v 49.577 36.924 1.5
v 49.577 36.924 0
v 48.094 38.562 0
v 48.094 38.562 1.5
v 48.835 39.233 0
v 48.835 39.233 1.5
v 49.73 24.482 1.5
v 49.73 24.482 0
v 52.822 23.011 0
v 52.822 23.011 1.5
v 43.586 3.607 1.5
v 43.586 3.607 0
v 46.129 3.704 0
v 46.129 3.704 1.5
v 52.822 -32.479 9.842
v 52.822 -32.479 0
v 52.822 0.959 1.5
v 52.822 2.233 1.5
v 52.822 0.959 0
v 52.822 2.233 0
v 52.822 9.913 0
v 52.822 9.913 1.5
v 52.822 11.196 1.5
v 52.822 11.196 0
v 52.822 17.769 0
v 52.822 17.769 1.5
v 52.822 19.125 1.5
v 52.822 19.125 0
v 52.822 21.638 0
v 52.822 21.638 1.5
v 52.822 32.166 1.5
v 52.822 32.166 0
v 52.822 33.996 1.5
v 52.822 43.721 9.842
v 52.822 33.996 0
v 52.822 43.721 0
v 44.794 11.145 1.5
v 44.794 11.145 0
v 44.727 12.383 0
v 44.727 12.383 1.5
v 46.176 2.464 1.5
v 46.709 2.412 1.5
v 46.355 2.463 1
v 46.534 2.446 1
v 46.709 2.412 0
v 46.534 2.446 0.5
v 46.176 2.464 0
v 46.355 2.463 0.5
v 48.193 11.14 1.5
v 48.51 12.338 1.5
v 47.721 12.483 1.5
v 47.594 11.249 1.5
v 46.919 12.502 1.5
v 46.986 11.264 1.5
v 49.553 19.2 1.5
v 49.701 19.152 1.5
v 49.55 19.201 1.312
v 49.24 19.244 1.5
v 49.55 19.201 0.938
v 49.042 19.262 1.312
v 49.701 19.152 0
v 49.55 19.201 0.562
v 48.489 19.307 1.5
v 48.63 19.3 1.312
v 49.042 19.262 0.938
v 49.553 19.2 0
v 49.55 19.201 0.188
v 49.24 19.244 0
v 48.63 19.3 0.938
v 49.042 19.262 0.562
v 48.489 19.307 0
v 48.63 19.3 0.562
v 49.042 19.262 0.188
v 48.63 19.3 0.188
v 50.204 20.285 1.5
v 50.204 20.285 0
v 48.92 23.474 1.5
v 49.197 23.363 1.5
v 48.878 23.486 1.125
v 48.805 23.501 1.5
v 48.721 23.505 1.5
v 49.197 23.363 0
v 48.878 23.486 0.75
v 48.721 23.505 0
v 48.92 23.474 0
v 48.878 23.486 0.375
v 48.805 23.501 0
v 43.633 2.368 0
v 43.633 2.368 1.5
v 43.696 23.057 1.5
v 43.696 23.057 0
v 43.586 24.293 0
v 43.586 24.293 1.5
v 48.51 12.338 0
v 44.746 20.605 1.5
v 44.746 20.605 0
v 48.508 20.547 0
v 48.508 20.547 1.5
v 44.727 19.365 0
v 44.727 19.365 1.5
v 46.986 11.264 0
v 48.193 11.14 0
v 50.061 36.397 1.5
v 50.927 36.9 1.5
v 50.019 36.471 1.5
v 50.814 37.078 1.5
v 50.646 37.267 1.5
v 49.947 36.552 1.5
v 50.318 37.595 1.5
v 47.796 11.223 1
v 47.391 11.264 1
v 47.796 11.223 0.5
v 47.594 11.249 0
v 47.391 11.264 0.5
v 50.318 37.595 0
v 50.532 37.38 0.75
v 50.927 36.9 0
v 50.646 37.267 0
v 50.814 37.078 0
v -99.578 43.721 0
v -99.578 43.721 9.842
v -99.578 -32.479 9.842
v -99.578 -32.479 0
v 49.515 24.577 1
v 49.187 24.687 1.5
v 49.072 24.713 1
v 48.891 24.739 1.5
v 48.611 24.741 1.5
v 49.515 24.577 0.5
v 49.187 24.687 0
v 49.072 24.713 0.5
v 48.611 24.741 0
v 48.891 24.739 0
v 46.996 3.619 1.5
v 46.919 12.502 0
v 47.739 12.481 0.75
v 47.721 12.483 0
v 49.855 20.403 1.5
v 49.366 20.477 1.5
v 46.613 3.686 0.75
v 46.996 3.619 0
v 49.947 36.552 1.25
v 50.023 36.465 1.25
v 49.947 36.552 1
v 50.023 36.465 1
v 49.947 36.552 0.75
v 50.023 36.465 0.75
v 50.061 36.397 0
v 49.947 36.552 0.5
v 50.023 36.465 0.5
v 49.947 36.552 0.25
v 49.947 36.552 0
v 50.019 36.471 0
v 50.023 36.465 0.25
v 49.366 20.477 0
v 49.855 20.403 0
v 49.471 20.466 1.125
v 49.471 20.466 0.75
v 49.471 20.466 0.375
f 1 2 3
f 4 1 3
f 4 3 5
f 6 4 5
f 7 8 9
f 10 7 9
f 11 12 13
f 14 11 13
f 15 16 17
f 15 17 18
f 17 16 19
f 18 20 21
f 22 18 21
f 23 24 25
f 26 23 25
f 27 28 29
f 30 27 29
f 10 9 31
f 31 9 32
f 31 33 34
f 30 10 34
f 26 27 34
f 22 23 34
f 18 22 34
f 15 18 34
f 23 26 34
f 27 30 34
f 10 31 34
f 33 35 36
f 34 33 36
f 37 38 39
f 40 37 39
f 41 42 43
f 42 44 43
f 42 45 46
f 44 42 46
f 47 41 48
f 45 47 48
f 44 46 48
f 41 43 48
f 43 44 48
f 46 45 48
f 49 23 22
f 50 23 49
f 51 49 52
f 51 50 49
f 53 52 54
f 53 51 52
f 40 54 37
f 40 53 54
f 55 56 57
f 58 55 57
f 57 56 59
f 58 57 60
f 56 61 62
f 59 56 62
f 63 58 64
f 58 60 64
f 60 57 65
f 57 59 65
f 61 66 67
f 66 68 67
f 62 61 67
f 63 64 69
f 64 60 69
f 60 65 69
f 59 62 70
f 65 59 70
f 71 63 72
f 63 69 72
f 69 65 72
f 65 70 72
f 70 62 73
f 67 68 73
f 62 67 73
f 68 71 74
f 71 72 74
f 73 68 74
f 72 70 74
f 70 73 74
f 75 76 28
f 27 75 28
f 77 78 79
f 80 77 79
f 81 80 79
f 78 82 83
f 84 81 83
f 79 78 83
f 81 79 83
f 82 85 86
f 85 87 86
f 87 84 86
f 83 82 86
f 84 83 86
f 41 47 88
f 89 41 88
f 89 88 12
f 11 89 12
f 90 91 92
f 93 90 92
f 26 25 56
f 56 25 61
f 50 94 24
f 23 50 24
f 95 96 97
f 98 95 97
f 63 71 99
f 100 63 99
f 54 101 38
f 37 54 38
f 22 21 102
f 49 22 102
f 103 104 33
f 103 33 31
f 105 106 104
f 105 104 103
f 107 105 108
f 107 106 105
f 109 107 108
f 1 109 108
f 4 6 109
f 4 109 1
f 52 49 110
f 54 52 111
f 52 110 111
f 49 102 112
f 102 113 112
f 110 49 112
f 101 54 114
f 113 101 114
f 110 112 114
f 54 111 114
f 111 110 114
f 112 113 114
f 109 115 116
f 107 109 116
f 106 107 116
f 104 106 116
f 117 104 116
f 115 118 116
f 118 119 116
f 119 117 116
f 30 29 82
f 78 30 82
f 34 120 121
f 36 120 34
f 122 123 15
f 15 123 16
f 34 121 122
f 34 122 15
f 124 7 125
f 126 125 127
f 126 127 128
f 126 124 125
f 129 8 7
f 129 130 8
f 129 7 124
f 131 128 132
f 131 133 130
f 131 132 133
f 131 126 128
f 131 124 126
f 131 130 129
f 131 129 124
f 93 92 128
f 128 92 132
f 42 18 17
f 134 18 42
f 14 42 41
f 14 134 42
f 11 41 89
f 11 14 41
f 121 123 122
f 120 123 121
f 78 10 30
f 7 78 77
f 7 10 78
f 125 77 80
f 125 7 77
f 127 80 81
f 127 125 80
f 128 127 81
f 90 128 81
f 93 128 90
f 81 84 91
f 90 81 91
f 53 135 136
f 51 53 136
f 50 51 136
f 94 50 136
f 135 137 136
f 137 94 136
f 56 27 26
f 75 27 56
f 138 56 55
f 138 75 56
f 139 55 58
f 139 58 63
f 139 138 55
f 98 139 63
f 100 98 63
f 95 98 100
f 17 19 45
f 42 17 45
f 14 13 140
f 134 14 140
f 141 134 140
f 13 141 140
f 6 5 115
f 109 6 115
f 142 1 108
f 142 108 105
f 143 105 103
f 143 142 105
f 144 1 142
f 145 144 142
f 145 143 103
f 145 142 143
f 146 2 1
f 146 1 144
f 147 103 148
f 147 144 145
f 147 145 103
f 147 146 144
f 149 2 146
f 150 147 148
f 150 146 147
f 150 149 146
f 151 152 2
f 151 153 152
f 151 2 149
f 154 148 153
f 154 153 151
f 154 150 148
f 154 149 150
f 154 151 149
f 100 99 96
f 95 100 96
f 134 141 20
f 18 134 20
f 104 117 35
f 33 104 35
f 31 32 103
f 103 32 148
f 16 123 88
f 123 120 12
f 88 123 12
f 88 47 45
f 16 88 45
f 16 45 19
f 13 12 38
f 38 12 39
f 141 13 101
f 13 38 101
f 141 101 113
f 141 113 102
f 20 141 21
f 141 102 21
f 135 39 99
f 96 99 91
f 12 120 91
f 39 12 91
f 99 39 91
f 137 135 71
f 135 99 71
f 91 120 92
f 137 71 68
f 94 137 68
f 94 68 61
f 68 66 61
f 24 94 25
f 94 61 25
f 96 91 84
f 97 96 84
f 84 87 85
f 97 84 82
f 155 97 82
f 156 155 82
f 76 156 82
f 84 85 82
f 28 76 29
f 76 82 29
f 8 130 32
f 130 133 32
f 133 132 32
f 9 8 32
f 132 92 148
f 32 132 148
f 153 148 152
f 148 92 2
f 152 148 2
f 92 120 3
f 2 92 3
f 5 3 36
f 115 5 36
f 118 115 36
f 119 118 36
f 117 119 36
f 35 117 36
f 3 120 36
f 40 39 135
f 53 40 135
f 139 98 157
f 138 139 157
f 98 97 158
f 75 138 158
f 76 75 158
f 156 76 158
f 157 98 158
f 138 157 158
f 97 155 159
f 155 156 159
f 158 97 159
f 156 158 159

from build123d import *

# Parameters (mm, degrees)
SKETCH1_W           = 152.4
SKETCH1_H           = 76.2
BOSS_EXTRUDE1_DEPTH = 9.8425
CUT_EXTRUDE8_DEPTH  = 1.5


with BuildPart() as part:
    # Sketch1 → Boss-Extrude1 (new body)
    with BuildSketch(Plane.XY):
        with Locations((-23.377517564, 5.621311475)):
            Rectangle(SKETCH1_W, SKETCH1_H)
    extrude(amount=BOSS_EXTRUDE1_DEPTH)

    # Sketch3 → Cut-Extrude8 (cut)
    with BuildSketch(Plane(origin=(0, 0, 0), x_dir=(-1, 0, 0), z_dir=(0, 0, -1))):
        with BuildLine():
            Line((-44.726890699, 19.36528147), (-44.746173598, 20.60513153))
            Line((-44.746173598, 20.60513153), (-48.508169632, 20.546622687))
            add(Edge.make_bspline(
                [(-48.508169632, 20.546622687), (-48.675949577, 20.544013272), (-48.999612816, 20.508916083), (-49.453378931, 20.473147329), (-49.871303207, 20.41073695), (-50.080872244, 20.33969012), (-50.203656688, 20.28530547)],
                knots=[0, 0, 0, 0, 0.294090065, 0.560497026, 0.802762471, 1, 1, 1, 1], degree=3))
            Line((-50.203656688, 20.28530547), (-54.969880773, 18.174212082))
            Line((-54.969880773, 18.174212082), (-54.969880773, 16.818021026))
            Line((-54.969880773, 16.818021026), (-49.701481232, 19.15154191))
            add(Edge.make_bspline(
                [(-49.701481232, 19.15154191), (-49.684189468, 19.159200913), (-49.641908349, 19.176694453), (-49.615145416, 19.185491037), (-49.542253946, 19.205696369), (-49.306018818, 19.23908556), (-49.048707603, 19.261574509), (-48.81409331, 19.283282924), (-48.617674753, 19.301576909), (-48.535974126, 19.306040296), (-48.488886733, 19.306772628)],
                knots=[0, 0, 0, 0, 0.0625, 0.125, 0.25, 0.5, 0.625, 0.75, 0.875, 1, 1, 1, 1], degree=3))
            Line((-48.488886733, 19.306772628), (-44.726890699, 19.36528147))
        make_face()
        with BuildLine():
            Line((-48.51035266, 12.33832191), (-54.640552611, 10.71460266))
            Line((-54.640552611, 10.71460266), (-54.323059589, 9.515937494))
            Line((-54.323059589, 9.515937494), (-48.192859639, 11.139656744))
            add(Edge.make_bspline(
                [(-48.192859639, 11.139656744), (-47.801843994, 11.243225899), (-47.389624666, 11.285533217), (-46.985715874, 11.263681617)],
                knots=[0, 0, 0, 0, 1, 1, 1, 1], degree=3))
            Line((-46.985715874, 11.263681617), (-44.793877153, 11.145102413))
            Line((-44.793877153, 11.145102413), (-44.726890699, 12.383291742))
            Line((-44.726890699, 12.383291742), (-46.91872942, 12.501870946))
            add(Edge.make_bspline(
                [(-46.91872942, 12.501870946), (-47.194365308, 12.516782939), (-47.729183274, 12.503182846), (-48.255253092, 12.405890682), (-48.51035266, 12.33832191)],
                knots=[0, 0, 0, 0, 0.511109576, 1, 1, 1, 1], degree=3))
        make_face()
        with BuildLine():
            Line((-43.695780501, 23.057490694), (-43.585687495, 24.292593738))
            Line((-43.585687495, 24.292593738), (-48.610973749, 24.740531156))
            add(Edge.make_bspline(
                [(-49.729956575, 24.482368714), (-49.65941327, 24.515933386), (-49.446393149, 24.611001503), (-49.075607523, 24.730735276), (-48.767132086, 24.754450595), (-48.610973749, 24.740531156)],
                knots=[0, 0, 0, 0, 0.202889278, 0.601788175, 1, 1, 1, 1], degree=3))
            Line((-49.729956575, 24.482368714), (-54.87453465, 22.034566258))
            Line((-54.87453465, 22.034566258), (-54.87453465, 20.661360507))
            Line((-54.87453465, 20.661360507), (-49.197193201, 23.362653042))
            add(Edge.make_bspline(
                [(-49.197193201, 23.362653042), (-49.139010306, 23.390336601), (-49.01099741, 23.446228058), (-48.872225099, 23.490335328), (-48.768651785, 23.507240994), (-48.740242067, 23.507137336), (-48.721066755, 23.505428112)],
                knots=[0, 0, 0, 0, 0.25, 0.5, 0.75, 1, 1, 1, 1], degree=3))
            Line((-48.721066755, 23.505428112), (-43.695780501, 23.057490694))
        make_face()
        with BuildLine():
            Line((-50.927422497, 36.90011515), (-54.94436907, 30.743988904))
            Line((-54.94436907, 30.743988904), (-54.94436907, 28.914050382))
            Line((-54.94436907, 28.914050382), (-50.061346642, 36.39747143))
            add(Edge.make_bspline(
                [(-49.576742638, 36.923837605), (-49.646063205, 36.847240879), (-49.809278874, 36.686241544), (-49.959721756, 36.541529579), (-50.019559683, 36.473902058), (-50.039690523, 36.439546623), (-50.030564548, 36.457569967), (-50.053366622, 36.413042841), (-50.061346642, 36.39747143)],
                knots=[0, 0, 0, 0, 0.26390369, 0.527807381, 0.791711071, 0.923662916, 0.989638839, 1.055614761, 1.055614761, 1.055614761, 1.055614761], degree=3))
            Line((-49.576742638, 36.923837605), (-48.093832254, 38.562400084))
            Line((-48.093832254, 38.562400084), (-48.835277647, 39.233413296))
            Line((-48.835277647, 39.233413296), (-50.31818803, 37.594850816))
            add(Edge.make_bspline(
                [(-50.31818803, 37.594850816), (-50.385599817, 37.520363224), (-50.609375158, 37.305637276), (-50.831157934, 37.08795617), (-50.927422497, 36.90011515)],
                knots=[0, 0, 0, 0, 0.326998241, 1, 1, 1, 1], degree=3))
        make_face()
        with BuildLine():
            Line((-46.996369813, 3.618538944), (-54.86449918, 1.747502797))
            Line((-54.86449918, 1.747502797), (-54.577627521, 0.541142713))
            Line((-54.577627521, 0.541142713), (-46.709498155, 2.41217886))
            add(Edge.make_bspline(
                [(-46.709498155, 2.41217886), (-46.535591864, 2.453533665), (-46.354408424, 2.471188006), (-46.17578104, 2.46441487)],
                knots=[0, 0, 0, 0, 1, 1, 1, 1], degree=3))
            Line((-46.17578104, 2.46441487), (-43.632671657, 2.367986057))
            Line((-43.632671657, 2.367986057), (-43.585687495, 3.607095611))
            Line((-43.585687495, 3.607095611), (-46.128796878, 3.703524424))
            add(Edge.make_bspline(
                [(-46.128796878, 3.703524424), (-46.291398125, 3.709689887), (-46.582443275, 3.698945442), (-46.869328394, 3.648749312), (-46.996369813, 3.618538944)],
                knots=[0, 0, 0, 0, 0.554289031, 1, 1, 1, 1], degree=3))
        make_face()
    extrude(amount=-CUT_EXTRUDE8_DEPTH, mode=Mode.SUBTRACT)


solid = part.part
